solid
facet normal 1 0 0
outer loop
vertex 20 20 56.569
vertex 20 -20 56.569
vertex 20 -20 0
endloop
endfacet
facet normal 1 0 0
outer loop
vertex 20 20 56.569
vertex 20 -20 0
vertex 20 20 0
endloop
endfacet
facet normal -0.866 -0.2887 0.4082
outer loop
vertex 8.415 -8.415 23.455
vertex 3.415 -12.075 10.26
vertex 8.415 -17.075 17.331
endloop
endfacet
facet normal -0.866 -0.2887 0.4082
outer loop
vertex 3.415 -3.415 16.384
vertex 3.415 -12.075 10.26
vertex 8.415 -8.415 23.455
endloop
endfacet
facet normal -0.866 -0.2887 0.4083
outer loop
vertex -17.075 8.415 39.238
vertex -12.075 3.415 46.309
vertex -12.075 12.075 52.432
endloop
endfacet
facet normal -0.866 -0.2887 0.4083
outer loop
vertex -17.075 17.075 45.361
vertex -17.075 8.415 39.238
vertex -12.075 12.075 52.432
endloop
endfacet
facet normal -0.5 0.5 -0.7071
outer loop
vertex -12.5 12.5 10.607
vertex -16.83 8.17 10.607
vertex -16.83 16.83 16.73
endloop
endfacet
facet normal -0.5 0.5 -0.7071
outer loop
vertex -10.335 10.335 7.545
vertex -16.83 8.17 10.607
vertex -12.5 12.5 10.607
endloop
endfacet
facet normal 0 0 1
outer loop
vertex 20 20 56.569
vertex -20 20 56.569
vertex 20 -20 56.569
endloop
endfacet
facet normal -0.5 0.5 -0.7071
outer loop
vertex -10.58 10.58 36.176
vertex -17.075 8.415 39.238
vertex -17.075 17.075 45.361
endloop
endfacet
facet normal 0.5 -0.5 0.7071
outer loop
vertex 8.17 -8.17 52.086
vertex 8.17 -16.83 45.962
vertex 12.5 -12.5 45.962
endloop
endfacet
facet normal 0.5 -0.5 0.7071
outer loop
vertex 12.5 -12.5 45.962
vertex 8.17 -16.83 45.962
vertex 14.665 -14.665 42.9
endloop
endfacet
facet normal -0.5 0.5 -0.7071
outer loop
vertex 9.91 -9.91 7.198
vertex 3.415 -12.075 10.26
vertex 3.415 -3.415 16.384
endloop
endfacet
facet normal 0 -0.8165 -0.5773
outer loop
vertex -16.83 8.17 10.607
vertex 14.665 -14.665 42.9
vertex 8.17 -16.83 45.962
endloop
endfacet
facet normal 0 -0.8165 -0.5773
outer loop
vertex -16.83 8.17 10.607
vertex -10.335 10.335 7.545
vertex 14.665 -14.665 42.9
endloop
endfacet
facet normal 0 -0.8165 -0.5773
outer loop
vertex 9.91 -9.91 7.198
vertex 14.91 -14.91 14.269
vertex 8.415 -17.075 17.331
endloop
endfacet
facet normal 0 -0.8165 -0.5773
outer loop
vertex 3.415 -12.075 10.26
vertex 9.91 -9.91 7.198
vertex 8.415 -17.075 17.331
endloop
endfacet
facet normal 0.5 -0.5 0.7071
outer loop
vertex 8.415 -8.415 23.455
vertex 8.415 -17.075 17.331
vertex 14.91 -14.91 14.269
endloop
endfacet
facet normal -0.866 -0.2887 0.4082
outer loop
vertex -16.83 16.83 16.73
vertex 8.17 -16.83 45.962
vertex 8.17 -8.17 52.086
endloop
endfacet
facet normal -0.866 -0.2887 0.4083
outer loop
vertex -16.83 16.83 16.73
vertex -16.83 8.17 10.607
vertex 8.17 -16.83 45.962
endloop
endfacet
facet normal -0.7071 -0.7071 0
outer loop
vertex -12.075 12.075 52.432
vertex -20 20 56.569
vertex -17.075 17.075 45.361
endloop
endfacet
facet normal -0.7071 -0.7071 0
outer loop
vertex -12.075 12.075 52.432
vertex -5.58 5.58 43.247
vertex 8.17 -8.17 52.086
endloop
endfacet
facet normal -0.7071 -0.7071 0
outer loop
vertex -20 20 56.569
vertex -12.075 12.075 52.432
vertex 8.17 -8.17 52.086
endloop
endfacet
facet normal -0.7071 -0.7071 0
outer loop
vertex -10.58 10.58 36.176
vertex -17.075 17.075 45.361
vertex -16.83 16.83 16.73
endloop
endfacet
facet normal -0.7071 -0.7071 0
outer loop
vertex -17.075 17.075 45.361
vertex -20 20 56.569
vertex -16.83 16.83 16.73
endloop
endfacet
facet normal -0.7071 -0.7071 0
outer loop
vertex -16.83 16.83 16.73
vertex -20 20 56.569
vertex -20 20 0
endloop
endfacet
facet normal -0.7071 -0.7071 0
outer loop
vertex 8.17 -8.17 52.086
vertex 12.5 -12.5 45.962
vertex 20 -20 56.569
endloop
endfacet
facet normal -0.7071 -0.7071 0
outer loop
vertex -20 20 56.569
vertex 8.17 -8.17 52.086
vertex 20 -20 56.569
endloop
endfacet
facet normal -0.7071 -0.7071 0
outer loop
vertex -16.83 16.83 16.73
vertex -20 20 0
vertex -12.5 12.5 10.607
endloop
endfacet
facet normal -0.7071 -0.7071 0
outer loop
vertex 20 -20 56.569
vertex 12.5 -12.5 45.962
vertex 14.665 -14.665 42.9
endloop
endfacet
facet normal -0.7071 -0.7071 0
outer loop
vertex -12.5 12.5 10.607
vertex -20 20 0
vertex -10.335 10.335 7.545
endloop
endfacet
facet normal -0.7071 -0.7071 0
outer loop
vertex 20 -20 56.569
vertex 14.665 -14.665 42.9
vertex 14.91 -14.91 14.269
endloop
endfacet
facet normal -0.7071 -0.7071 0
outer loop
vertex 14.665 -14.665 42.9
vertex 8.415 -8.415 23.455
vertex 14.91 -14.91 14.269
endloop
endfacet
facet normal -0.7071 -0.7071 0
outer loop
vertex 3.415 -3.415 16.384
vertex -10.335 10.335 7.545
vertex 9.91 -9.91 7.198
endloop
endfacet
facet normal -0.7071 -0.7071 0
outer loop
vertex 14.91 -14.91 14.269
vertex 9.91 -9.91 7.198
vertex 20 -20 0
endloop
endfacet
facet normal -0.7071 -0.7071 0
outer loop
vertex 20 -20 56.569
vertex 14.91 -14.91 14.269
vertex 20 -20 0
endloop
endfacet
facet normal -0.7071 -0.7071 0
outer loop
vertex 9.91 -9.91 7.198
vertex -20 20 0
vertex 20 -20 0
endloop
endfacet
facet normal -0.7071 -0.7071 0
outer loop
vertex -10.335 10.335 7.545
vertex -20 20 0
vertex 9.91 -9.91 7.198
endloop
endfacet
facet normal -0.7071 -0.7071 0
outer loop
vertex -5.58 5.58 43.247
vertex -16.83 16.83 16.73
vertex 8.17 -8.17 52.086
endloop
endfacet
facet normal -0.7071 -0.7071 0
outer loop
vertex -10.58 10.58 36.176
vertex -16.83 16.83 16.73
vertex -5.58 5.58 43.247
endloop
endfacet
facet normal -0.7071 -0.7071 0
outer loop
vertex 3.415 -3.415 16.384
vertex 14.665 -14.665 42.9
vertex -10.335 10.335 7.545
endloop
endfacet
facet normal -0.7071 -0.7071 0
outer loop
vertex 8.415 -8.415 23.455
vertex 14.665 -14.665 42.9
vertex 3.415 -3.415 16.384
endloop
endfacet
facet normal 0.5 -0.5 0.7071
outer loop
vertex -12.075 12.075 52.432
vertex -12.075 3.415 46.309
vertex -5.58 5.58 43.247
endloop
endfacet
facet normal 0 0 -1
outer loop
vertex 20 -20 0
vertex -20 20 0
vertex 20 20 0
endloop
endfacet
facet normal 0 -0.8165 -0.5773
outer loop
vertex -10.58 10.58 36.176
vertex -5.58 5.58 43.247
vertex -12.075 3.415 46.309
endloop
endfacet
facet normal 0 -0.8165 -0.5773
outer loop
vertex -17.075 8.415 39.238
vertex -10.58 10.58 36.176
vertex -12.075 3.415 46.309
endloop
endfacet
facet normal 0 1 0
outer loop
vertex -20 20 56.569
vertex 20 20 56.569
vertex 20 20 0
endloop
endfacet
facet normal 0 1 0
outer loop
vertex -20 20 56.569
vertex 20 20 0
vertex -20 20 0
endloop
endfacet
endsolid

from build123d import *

# Parameters (mm, degrees)
F1_DEPTH = 56.5685424949
F5_DEPTH = 5
F6_DEPTH = 25


with BuildPart() as f1:
    # F0 (on Top) → F1 (new body)
    with BuildSketch(Plane.XY):
        Polygon((20, -20), (20, 20), (-20, 20), align=None)
    extrude(amount=F1_DEPTH)

    # F4 (on face) → F5 (join, symmetric)
    with BuildSketch(Plane(origin=(10, -10, 14.1421356237), x_dir=(0.8660254038, 0.2886751346, -0.4082482905), z_dir=(-0.5, 0.5, -0.7071067812))):
        Polygon((-28.3771324027, -29.5247237874), (-28.3771324027, -40.1313255052), (-20.8771324027, -29.5247237874), align=None)
        Polygon((-4.7168783649, 3.9359283621), (-4.7168783649, -6.6706733557), (2.7831216351, 3.9359283621), align=None)
    extrude(amount=F5_DEPTH, both=True)

    # F4 (on face) → F6 (join, symmetric)
    with BuildSketch(Plane(origin=(10, -10, 14.1421356237), x_dir=(0.8660254038, 0.2886751346, -0.4082482905), z_dir=(-0.5, 0.5, -0.7071067812))):
        Polygon((-16.5470053838, -12.7943977126), (-16.5470053838, -23.4009994304), (-11.5470053838, -16.3299316186), align=None)
        Polygon((-9.0470053838, -12.7943977126), (-16.5470053838, -12.7943977126), (-11.5470053838, -16.3299316186), align=None)
    extrude(amount=F6_DEPTH, both=True)


solid = f1.part
